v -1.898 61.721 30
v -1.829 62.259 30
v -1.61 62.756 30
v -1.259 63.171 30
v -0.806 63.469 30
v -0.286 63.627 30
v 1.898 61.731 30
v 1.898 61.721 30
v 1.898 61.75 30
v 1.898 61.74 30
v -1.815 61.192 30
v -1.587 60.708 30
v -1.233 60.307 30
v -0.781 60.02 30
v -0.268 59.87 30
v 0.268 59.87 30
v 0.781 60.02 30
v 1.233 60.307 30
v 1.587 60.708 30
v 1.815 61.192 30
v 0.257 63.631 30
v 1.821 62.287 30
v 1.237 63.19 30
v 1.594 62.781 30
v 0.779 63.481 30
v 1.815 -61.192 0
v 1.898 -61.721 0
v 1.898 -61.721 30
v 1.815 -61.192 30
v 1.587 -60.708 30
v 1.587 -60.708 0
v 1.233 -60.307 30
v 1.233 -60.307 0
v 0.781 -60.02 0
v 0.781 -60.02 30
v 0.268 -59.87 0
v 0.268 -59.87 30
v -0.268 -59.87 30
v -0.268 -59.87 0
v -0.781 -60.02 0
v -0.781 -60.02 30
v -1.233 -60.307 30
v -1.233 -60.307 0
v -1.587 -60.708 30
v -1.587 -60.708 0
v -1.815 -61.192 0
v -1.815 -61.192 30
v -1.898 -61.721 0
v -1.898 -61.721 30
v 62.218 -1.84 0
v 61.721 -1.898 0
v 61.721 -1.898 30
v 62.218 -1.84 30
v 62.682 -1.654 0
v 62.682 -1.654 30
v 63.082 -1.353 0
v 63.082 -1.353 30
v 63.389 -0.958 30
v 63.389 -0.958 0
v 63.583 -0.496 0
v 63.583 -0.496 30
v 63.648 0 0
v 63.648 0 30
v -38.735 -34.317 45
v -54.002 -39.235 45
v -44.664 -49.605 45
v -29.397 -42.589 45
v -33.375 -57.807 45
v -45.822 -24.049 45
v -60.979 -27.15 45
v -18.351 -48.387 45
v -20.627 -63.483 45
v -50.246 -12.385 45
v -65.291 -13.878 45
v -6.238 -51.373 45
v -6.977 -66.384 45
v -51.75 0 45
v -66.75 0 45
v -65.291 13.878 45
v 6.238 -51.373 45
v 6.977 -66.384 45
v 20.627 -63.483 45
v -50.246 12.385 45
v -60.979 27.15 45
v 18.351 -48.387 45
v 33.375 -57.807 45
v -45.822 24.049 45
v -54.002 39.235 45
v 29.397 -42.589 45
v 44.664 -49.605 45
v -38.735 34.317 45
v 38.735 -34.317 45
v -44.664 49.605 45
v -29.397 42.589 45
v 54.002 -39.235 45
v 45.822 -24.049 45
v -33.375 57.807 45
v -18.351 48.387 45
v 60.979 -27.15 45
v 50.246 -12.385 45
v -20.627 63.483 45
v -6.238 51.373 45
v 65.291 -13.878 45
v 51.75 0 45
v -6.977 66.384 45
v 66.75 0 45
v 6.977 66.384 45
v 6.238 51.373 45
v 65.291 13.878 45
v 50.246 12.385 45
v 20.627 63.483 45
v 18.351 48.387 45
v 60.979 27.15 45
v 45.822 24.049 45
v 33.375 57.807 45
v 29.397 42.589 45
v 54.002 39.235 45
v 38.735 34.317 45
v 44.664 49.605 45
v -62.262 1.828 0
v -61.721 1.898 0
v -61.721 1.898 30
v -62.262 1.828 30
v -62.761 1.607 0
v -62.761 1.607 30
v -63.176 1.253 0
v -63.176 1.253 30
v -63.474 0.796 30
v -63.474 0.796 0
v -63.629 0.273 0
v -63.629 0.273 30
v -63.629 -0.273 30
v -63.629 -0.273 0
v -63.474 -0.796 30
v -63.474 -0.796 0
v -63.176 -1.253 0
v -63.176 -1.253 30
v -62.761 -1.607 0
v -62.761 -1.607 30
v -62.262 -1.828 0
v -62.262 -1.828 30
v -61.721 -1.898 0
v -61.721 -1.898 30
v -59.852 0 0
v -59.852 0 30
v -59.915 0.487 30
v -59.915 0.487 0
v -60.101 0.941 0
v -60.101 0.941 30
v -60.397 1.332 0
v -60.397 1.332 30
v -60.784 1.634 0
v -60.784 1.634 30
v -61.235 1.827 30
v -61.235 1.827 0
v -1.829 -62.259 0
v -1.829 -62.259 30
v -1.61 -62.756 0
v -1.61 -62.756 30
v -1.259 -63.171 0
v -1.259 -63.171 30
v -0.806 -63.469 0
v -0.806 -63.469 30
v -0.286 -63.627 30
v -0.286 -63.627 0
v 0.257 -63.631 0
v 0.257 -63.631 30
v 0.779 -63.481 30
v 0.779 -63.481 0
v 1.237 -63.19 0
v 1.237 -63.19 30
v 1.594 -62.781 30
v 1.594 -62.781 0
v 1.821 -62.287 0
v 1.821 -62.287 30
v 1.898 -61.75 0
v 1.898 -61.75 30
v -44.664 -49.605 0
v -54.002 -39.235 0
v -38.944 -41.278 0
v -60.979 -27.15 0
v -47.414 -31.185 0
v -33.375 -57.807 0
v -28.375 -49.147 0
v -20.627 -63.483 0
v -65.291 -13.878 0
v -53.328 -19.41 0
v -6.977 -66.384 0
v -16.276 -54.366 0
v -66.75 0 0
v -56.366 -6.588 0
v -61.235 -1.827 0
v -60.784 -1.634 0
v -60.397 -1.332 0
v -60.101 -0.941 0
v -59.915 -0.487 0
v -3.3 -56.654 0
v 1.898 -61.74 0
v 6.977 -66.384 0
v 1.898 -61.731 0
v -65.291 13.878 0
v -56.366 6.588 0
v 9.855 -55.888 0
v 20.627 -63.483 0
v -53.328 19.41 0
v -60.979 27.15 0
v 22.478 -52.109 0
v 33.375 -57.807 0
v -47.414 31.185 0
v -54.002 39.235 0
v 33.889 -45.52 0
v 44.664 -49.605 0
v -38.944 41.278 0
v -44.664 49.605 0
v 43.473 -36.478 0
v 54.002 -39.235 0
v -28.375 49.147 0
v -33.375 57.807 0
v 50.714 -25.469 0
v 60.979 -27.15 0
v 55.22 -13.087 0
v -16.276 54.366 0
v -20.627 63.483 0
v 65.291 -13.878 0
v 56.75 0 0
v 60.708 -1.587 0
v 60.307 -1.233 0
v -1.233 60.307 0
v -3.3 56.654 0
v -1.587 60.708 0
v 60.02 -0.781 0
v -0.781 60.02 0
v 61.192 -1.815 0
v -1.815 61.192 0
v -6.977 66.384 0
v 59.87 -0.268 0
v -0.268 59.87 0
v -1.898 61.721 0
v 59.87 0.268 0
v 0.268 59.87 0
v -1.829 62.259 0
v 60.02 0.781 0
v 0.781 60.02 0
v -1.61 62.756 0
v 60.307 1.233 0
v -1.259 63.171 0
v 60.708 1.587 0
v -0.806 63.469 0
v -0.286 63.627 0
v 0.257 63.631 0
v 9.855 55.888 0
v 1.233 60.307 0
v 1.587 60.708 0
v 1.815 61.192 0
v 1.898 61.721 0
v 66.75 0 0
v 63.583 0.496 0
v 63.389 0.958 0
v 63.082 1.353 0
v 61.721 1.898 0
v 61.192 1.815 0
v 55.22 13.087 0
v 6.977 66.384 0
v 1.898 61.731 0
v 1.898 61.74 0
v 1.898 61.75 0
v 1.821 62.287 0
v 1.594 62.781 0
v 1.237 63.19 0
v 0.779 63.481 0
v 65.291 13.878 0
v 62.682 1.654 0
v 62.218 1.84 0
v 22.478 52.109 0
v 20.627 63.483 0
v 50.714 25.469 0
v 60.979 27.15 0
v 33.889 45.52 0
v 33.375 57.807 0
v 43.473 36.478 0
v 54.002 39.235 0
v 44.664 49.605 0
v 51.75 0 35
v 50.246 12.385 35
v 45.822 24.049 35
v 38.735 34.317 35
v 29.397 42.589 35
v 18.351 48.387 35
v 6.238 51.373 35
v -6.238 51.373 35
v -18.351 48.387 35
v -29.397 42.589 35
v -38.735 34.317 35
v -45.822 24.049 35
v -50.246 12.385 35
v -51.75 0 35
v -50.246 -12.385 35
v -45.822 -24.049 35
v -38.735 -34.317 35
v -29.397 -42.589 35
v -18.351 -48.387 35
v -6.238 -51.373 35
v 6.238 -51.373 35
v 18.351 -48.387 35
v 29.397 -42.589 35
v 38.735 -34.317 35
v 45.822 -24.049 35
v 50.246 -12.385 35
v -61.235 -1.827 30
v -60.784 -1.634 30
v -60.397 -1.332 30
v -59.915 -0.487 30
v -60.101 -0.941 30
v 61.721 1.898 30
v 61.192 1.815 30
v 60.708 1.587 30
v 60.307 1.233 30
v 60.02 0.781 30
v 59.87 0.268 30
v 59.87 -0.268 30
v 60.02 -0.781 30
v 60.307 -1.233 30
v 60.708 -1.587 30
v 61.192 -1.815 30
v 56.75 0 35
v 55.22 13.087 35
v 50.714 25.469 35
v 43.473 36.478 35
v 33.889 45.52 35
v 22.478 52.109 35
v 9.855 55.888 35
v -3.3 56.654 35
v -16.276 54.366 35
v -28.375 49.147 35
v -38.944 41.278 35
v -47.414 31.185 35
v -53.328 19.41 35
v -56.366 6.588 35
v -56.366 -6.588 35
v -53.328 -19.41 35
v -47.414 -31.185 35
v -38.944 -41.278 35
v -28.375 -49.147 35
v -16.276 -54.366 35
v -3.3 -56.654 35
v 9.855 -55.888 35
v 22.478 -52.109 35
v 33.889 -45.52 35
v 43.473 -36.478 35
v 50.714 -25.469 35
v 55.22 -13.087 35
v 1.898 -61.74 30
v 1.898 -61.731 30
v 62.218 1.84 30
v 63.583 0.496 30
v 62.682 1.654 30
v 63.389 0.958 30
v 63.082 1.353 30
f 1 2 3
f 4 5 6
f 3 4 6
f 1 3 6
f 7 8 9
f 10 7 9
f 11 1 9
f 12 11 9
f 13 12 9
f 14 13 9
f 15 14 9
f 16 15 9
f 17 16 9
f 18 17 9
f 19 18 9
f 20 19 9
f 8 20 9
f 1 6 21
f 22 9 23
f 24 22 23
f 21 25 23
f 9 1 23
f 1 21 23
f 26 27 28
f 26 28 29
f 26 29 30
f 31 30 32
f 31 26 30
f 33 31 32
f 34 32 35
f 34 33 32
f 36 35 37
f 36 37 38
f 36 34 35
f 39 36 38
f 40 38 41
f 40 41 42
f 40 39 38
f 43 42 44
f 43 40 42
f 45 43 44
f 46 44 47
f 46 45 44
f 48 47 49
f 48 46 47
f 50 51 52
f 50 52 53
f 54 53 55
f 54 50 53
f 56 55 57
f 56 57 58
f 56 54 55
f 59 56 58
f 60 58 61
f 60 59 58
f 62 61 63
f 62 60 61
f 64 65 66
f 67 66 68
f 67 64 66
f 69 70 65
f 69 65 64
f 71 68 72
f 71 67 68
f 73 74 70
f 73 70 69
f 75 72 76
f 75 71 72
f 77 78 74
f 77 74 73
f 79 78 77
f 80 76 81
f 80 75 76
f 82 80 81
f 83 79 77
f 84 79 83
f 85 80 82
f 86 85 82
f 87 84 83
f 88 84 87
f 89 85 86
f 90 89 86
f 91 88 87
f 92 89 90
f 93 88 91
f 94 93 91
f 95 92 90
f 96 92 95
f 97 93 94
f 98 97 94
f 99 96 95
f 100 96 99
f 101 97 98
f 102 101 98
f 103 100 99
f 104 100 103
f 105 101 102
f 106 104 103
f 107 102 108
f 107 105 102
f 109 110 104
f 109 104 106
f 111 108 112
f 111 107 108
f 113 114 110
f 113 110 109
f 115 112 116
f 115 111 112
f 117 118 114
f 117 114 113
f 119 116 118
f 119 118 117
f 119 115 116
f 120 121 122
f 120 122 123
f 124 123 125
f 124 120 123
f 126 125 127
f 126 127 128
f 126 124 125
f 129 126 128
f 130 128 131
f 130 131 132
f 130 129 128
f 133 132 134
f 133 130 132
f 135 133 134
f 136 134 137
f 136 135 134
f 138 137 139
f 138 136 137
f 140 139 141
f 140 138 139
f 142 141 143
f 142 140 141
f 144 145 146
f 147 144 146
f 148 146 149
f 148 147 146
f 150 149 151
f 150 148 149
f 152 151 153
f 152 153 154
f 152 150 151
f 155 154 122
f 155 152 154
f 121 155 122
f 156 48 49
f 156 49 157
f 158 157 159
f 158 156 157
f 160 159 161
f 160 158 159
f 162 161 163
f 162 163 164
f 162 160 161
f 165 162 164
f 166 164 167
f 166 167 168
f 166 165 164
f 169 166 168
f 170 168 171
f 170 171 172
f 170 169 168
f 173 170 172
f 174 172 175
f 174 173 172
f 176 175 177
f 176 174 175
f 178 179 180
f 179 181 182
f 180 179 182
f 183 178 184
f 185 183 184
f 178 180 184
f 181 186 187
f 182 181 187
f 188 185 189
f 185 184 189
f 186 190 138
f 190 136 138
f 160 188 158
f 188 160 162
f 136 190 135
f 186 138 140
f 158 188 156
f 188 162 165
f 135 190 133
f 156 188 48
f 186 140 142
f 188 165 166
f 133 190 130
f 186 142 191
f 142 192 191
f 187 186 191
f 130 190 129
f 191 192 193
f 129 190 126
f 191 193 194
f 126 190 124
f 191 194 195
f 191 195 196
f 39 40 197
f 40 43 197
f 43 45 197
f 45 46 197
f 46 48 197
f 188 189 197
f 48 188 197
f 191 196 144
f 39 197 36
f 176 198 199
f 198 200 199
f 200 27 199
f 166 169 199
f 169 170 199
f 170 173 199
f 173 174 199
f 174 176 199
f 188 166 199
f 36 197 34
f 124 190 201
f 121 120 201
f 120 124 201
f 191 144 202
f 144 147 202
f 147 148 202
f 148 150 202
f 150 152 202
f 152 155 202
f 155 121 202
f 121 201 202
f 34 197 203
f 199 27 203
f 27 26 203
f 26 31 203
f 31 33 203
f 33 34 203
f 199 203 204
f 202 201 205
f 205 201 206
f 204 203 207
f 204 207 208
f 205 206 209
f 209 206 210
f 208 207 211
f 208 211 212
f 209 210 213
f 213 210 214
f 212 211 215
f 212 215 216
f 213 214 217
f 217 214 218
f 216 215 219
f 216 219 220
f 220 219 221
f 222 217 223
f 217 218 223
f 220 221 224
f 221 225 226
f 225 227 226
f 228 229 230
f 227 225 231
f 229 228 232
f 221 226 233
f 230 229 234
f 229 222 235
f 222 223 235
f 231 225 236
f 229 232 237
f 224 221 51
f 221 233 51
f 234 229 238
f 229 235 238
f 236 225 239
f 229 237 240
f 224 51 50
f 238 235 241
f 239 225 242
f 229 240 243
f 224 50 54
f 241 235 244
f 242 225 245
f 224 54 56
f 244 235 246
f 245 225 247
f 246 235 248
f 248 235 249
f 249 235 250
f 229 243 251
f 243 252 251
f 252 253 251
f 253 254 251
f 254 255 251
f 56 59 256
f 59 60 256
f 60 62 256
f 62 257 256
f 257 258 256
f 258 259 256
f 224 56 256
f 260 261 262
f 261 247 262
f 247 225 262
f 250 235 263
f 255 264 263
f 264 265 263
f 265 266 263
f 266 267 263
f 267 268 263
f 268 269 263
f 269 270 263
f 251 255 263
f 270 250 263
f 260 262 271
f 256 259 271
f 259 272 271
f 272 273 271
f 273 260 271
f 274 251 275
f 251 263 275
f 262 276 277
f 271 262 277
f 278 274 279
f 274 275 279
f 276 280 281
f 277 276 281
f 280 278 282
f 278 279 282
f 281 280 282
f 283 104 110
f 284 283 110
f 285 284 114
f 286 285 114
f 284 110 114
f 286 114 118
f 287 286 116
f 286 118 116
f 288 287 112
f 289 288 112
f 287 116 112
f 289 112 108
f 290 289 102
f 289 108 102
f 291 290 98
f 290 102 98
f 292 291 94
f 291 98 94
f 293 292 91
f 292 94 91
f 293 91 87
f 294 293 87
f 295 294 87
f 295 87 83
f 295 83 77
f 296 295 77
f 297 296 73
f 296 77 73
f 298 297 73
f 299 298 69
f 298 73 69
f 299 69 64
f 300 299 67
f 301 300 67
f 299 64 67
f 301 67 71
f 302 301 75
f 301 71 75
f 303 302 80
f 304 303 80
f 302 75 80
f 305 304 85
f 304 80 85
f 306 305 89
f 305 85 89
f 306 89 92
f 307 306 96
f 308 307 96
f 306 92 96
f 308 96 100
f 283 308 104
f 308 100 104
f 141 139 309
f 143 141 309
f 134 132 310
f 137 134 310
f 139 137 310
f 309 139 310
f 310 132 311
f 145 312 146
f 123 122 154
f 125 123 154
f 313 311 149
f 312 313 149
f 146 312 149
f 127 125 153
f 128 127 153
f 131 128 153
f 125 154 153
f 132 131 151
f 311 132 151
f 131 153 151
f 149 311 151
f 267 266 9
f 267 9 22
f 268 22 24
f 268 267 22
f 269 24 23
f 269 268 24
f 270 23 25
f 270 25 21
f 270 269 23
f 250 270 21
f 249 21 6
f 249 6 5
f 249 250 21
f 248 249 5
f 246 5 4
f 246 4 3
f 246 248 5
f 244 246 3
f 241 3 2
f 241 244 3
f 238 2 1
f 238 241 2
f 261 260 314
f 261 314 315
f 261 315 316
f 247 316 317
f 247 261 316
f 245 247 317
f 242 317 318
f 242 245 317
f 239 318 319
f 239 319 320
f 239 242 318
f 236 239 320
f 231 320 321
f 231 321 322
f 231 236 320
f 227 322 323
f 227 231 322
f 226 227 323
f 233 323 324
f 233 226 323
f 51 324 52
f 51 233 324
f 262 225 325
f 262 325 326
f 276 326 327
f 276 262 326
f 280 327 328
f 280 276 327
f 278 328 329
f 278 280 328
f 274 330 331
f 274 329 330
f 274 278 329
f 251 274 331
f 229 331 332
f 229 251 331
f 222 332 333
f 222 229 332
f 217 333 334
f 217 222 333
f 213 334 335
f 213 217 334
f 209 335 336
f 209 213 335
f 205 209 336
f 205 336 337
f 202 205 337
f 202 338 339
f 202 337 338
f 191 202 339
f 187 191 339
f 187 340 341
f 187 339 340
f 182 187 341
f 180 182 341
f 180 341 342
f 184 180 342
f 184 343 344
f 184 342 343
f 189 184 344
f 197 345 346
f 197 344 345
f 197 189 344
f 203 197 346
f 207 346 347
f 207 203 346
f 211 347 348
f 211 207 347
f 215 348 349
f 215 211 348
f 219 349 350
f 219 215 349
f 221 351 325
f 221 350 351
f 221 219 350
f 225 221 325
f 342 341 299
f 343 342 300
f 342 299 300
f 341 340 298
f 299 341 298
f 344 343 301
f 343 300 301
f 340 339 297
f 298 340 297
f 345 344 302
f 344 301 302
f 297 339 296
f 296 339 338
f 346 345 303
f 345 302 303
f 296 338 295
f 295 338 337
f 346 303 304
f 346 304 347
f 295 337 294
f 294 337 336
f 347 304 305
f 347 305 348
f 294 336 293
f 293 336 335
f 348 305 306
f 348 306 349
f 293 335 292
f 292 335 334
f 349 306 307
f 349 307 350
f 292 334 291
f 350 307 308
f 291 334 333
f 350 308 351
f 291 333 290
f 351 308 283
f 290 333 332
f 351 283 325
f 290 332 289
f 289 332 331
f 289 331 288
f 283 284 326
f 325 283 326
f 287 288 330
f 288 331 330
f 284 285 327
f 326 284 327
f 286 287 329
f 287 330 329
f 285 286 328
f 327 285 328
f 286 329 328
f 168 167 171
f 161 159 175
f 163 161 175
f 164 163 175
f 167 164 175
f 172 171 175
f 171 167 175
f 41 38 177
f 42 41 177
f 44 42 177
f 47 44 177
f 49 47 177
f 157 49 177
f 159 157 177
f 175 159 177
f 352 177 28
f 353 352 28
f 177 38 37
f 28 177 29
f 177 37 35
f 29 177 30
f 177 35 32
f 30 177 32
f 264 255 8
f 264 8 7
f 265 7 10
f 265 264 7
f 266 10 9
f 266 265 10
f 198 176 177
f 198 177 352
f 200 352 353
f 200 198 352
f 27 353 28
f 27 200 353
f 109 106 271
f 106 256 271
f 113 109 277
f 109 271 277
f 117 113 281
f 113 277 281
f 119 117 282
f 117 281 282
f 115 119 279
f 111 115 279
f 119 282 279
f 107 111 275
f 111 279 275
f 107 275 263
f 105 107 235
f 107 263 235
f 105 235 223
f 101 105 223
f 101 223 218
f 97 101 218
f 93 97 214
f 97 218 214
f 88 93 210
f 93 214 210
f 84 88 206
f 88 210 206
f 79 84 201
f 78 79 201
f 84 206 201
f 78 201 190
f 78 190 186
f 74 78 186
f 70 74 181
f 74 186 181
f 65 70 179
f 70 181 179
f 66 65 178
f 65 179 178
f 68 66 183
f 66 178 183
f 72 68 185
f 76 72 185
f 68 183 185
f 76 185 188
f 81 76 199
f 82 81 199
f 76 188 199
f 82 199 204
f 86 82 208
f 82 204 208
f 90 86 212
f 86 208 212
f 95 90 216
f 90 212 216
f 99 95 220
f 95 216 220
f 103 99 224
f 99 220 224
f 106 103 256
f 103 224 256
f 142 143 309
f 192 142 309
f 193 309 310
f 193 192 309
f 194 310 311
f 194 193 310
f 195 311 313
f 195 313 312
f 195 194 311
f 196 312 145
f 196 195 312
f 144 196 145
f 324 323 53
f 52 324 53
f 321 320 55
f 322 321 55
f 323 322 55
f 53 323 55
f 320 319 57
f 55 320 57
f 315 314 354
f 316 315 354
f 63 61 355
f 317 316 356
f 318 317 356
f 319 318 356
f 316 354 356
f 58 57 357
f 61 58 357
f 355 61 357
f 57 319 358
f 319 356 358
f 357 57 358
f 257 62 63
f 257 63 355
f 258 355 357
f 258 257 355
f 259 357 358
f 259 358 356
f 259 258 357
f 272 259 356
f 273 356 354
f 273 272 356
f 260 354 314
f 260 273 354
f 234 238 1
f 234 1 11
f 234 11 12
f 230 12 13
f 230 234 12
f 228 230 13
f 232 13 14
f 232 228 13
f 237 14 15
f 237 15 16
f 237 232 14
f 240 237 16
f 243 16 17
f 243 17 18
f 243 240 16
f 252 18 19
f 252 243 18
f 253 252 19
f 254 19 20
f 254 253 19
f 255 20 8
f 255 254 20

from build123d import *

# Parameters (mm, degrees)
F0_R     = 66.75
F0_R_2   = 56.75
F1_DEPTH = 45
F2_R     = 66.75
F2_R_2   = 56.75
F2_R_3   = 51.75
F3_DEPTH = 10
F6_DEPTH = 30


with BuildPart() as f1:
    # F0 (on Top) → F1 (new body)
    with BuildSketch(Plane.XY):
        Circle(F0_R)
        Circle(F0_R_2, mode=Mode.SUBTRACT)
    extrude(amount=F1_DEPTH)

    # F2 (on face) → F3 (join)
    with BuildSketch(Plane.XY.offset(45)):
        Circle(F2_R)
        Circle(F2_R_2, mode=Mode.SUBTRACT)
        Circle(F2_R_2)
        Circle(F2_R_3, mode=Mode.SUBTRACT)
    extrude(amount=-F3_DEPTH)

    # F5 (on Top) → F6 (cut)
    with BuildSketch(Plane.XY):
        with BuildLine():
            ThreePointArc((-1.8982756668, 61.7208153664), (0, 61.75), (1.8982756668, 61.7208153664))
            ThreePointArc((1.8982756668, 61.7208153664), (1.8984439159, 61.7354072521), (1.8985, 61.75))
            ThreePointArc((1.8985, 61.75), (-0.0145927479, 63.6484439159), (-1.8982756668, 61.7208153664))
        make_face()
        with BuildLine():
            ThreePointArc((-1.8982756668, 61.7208153664), (0, 59.8515), (1.8982756668, 61.7208153664))
            ThreePointArc((1.8982756668, 61.7208153664), (0, 61.75), (-1.8982756668, 61.7208153664))
        make_face()
        with BuildLine():
            ThreePointArc((61.7208153664, 1.8982756668), (61.7427034105, 0.94925), (61.75, 0))
            ThreePointArc((61.75, 0), (61.7427034105, -0.94925), (61.7208153664, -1.8982756668))
            ThreePointArc((61.7208153664, -1.8982756668), (63.0820839356, -1.3527211976), (63.6485, 0))
            ThreePointArc((63.6485, 0), (63.0820839356, 1.3527211976), (61.7208153664, 1.8982756668))
        make_face()
        with BuildLine():
            ThreePointArc((61.7208153664, -1.8982756668), (61.7427034105, -0.94925), (61.75, 0))
            ThreePointArc((61.75, 0), (61.7427034105, 0.94925), (61.7208153664, 1.8982756668))
            ThreePointArc((61.7208153664, 1.8982756668), (59.8515, 0), (61.7208153664, -1.8982756668))
        make_face()
        with BuildLine():
            ThreePointArc((1.8985, -61.75), (1.8984439159, -61.7354072521), (1.8982756668, -61.7208153664))
            ThreePointArc((1.8982756668, -61.7208153664), (0, -61.75), (-1.8982756668, -61.7208153664))
            ThreePointArc((-1.8982756668, -61.7208153664), (-0.0145927479, -63.6484439159), (1.8985, -61.75))
        make_face()
        with BuildLine():
            ThreePointArc((-1.8982756668, -61.7208153664), (0, -61.75), (1.8982756668, -61.7208153664))
            ThreePointArc((1.8982756668, -61.7208153664), (0, -59.8515), (-1.8982756668, -61.7208153664))
        make_face()
        with BuildLine():
            ThreePointArc((-59.8515, 0), (-60.3972788024, 1.3320839356), (-61.7208153664, 1.8982756668))
            ThreePointArc((-61.7208153664, 1.8982756668), (-61.75, 0), (-61.7208153664, -1.8982756668))
            ThreePointArc((-61.7208153664, -1.8982756668), (-60.3972788024, -1.3320839356), (-59.8515, 0))
        make_face()
        with BuildLine():
            ThreePointArc((-61.7208153664, -1.8982756668), (-61.75, 0), (-61.7208153664, 1.8982756668))
            ThreePointArc((-61.7208153664, 1.8982756668), (-63.6485, 0), (-61.7208153664, -1.8982756668))
        make_face()
    extrude(amount=F6_DEPTH, mode=Mode.SUBTRACT)


solid = f1.part
